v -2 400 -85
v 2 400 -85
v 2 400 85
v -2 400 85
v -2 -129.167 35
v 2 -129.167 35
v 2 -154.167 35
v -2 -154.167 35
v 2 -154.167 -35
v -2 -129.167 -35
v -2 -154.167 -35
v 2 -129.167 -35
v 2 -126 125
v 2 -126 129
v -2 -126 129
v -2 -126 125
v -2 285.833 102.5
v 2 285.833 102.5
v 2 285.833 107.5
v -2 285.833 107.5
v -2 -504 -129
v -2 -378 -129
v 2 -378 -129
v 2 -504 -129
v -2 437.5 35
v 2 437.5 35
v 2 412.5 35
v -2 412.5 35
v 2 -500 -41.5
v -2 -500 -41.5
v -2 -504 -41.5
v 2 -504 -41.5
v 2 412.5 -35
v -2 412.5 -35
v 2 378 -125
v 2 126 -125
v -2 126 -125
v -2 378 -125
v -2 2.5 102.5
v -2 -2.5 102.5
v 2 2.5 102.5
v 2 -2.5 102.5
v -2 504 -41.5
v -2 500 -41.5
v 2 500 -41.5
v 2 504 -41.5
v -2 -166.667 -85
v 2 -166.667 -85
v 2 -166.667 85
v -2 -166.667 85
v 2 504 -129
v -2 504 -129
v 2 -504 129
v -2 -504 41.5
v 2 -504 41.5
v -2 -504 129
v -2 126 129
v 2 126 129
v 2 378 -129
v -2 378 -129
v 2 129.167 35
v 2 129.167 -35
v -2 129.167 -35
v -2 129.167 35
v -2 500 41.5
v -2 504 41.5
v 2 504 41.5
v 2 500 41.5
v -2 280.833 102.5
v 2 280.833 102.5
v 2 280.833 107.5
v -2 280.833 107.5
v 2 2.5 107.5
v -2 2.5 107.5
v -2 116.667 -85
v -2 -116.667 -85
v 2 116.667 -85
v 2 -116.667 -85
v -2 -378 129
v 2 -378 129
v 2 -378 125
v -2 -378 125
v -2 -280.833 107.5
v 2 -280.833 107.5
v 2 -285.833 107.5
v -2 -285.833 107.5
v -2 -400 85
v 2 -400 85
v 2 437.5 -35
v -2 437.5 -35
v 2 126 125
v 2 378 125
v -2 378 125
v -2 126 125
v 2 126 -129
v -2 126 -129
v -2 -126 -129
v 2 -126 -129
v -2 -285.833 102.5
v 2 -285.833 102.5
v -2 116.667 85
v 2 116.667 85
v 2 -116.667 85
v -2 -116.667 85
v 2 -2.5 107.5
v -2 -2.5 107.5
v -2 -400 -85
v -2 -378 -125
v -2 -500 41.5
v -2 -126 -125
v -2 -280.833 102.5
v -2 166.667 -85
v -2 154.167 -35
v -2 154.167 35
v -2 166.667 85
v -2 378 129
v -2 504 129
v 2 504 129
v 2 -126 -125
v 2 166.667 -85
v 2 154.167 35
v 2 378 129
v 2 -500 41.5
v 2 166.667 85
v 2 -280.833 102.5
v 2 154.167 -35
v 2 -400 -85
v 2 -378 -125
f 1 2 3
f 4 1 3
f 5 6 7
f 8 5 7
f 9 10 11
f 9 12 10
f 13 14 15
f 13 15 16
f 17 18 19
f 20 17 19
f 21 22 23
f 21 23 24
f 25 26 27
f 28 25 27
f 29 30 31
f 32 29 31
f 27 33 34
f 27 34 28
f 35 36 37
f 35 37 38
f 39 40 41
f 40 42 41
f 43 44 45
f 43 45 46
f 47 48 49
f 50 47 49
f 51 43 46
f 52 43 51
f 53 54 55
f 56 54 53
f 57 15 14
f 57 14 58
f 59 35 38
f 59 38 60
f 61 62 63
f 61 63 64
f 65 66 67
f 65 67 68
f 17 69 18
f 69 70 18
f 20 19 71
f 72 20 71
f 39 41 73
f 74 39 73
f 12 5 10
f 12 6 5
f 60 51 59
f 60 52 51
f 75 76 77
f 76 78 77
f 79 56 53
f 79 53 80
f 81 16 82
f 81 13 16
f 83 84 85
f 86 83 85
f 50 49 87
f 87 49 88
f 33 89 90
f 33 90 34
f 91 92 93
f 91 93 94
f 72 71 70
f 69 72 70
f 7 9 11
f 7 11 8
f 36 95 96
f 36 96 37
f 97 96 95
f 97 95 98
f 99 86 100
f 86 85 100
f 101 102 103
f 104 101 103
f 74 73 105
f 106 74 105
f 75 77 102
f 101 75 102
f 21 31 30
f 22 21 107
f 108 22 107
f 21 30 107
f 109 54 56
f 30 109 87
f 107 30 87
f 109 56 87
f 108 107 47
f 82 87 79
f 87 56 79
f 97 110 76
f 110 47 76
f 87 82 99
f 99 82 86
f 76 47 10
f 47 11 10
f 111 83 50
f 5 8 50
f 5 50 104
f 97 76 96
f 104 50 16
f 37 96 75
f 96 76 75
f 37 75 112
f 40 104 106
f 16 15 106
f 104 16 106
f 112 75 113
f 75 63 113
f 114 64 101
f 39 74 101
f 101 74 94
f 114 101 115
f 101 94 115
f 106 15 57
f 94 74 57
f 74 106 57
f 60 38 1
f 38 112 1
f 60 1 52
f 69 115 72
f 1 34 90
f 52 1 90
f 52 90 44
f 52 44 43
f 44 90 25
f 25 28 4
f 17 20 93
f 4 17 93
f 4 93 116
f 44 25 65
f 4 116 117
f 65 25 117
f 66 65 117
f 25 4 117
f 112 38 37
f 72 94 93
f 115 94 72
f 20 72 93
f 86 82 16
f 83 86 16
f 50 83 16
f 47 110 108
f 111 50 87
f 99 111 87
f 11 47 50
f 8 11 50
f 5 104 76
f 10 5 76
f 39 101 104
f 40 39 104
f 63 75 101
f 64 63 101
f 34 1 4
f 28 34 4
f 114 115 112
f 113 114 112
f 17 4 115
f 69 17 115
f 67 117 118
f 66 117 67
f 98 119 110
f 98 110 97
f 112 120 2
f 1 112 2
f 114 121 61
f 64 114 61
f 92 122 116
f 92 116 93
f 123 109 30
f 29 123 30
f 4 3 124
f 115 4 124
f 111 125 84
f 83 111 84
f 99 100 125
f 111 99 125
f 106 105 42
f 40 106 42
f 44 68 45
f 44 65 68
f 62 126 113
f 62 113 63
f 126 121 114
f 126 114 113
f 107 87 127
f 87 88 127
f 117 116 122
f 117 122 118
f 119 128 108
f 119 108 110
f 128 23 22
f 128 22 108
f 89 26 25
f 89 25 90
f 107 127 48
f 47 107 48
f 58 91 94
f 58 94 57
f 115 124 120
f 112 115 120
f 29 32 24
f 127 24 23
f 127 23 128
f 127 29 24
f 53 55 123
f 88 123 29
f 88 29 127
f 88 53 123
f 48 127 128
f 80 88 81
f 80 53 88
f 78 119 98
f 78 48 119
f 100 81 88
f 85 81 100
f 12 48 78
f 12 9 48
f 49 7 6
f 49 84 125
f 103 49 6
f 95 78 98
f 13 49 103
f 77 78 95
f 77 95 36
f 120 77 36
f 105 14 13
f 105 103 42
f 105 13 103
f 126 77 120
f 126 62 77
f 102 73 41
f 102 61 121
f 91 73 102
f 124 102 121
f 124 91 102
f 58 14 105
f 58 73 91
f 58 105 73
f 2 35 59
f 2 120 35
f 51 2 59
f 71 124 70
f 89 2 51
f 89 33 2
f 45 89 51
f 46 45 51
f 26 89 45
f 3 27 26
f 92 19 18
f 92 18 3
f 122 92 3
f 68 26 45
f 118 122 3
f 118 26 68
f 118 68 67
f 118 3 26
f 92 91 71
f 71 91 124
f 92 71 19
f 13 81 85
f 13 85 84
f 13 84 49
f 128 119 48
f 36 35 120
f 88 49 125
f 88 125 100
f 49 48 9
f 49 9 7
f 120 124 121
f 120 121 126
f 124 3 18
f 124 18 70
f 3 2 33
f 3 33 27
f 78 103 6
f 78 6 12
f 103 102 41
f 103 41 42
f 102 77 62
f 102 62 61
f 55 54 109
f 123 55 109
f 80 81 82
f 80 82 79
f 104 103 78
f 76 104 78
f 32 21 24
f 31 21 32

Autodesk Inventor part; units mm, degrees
ref_plane "YZ Plane" through (0, 0, 0) normal (1, 0, 0) x (0, 1, 0)
ref_plane "XZ Plane" through (0, 0, 0) normal (0, 1, 0) x (-1, 0, 0)
ref_plane "XY Plane" through (0, 0, 0) normal (0, 0, 1) x (1, 0, 0)
sketch "Esboço1" plane through (0, 0, 0) normal (1, 0, 0) x (0, 1, 0)
  line L0 (-504, 129) -> (504, 129)
  line L1 (504, 129) -> (504, -129)
  line L2 (504, -129) -> (-504, -129)
  line L3 (-504, -129) -> (-504, 129)
  line L4 (-504, 129) -> (504, -129) construction
  line L5 (504, 129) -> (-504, -129) construction
  point P0 (0, 0)
  dimension "d0" = 1008
  dimension "d1" = 258
extrude "Extrusão1" add sketch "Esboço1" along normal mid plane 4
sketch "Esboço2" plane through (2, 0, 0) normal (1, 0, 0) x (0, 0, -1)
  line L0 (-133, 378) -> (-125, 378)
  line L1 (-125, 378) -> (-125, 126)
  line L2 (-125, 126) -> (-133, 126)
  line L3 (-133, 126) -> (-133, 378)
  line L4 (-129, 504) -> (-129, -504) projected
  line L5 (-133, 378) -> (-125, 126) construction
  line L6 (-125, 378) -> (-133, 126) construction
  line L7 (129, 504) -> (-129, 504) projected
  line L8 (-133, -126) -> (-125, -126)
  line L9 (-125, -126) -> (-125, -378)
  line L10 (-125, -378) -> (-133, -378)
  line L11 (-133, -378) -> (-133, -126)
  line L12 (-133, -126) -> (-125, -378) construction
  line L13 (-125, -126) -> (-133, -378) construction
  line L14 (-129, -504) -> (129, -504) projected
  line L15 (125, 378) -> (133, 378)
  line L16 (133, 378) -> (133, 126)
  line L17 (133, 126) -> (125, 126)
  line L18 (125, 126) -> (125, 378)
  line L19 (129, -504) -> (129, 504) projected
  line L20 (125, 378) -> (133, 126) construction
  line L21 (133, 378) -> (125, 126) construction
  line L22 (125, -126) -> (133, -126)
  line L23 (133, -126) -> (133, -378)
  line L24 (133, -378) -> (125, -378)
  line L25 (125, -378) -> (125, -126)
  line L26 (125, -126) -> (133, -378) construction
  line L27 (133, -126) -> (125, -378) construction
  point P0 (0, 0)
  point P1 (-129, 252)
  point P2 (-129, -252)
  point P3 (129, 252)
  point P4 (129, -252)
  dimension "d4" = 8
  dimension "d5" = 252
  dimension "d6" = 126
  dimension "d7" = 8
  dimension "d8" = 252
  dimension "d9" = 252
  dimension "d10" = 126
  dimension "d11" = 126
  dimension "d12" = 252
  dimension "d13" = 8
  dimension "d14" = 252
  dimension "d15" = 8
  dimension "d16" = 252
  dimension "d17" = 126
extrude "Extrusão2" cut sketch "Esboço2" along normal through all both and the other way through all contours L0 L4 L2 L3 | L0 L1 L2 L4 | L8 L9 L10 L4 | L4 L10 L11 L8 | L19 L17 L18 L15 | L15 L16 L17 L19 | L22 L23 L24 L19 | L19 L24 L25 L22
sketch "Esboço3" plane through (2, 0, 0) normal (1, 0, 0) x (0, 0, -1)
  line L0 (-41.5, 500) -> (41.5, 500)
  line L1 (41.5, 500) -> (41.5, 508)
  line L2 (41.5, 508) -> (-41.5, 508)
  line L3 (-41.5, 508) -> (-41.5, 500)
  line L4 (129, 504) -> (-129, 504) projected
  line L5 (-41.5, 500) -> (41.5, 508) construction
  line L6 (41.5, 500) -> (-41.5, 508) construction
  line L7 (-41.5, -500) -> (41.5, -500)
  line L8 (41.5, -500) -> (41.5, -508)
  line L9 (41.5, -508) -> (-41.5, -508)
  line L10 (-41.5, -508) -> (-41.5, -500)
  line L11 (-129, -504) -> (129, -504) projected
  line L12 (-41.5, -500) -> (41.5, -508) construction
  line L13 (41.5, -500) -> (-41.5, -508) construction
  point P0 (0, 0)
  point P1 (0, 504)
  point P2 (0, -504)
  dimension "d20" = 83
  dimension "d21" = 8
  dimension "d22" = 83
  dimension "d23" = 8
extrude "Extrusão3" cut sketch "Esboço3" along normal through all both and the other way through all
sketch "Esboço5" plane through (2, 0, 0) normal (1, 0, 0) x (0, 0, -1)
  line L0 (41.5, 500) -> (-41.5, 500) projected
  line L1 (0, 400) -> (-85, 400)
  line L2 (-125, 378) -> (-125, 126) projected
  line L3 (0, 400) -> (85, 400)
  line L4 (-85, 400) -> (-85, 166.6667)
  line L5 (-85, 166.6667) -> (85, 166.6667)
  line L6 (85, 166.6667) -> (85, 400)
  point P0 (0, 0)
  dimension "d39" = 85
  dimension "d40" = 85
  dimension "d41" = 233.3333
extrude "Extrusão5" cut sketch "Esboço5" against normal through all
pattern_linear "Padrão retangular2" count 3 spacing 283.3333 along (0, -1, 0) of "Extrusão5"
sketch "Esboço6" plane through (2, 0, 0) normal (1, 0, 0) x (0, 0, -1)
  line L0 (-85, -166.6667) -> (85, -166.6667) projected
  line L1 (85, -116.6667) -> (-85, -116.6667) projected
  line L2 (-85, -116.6667) -> (-35, -116.6667)
  line L3 (85, -116.6667) -> (35, -116.6667)
  line L4 (35, -116.6667) -> (-35, -116.6667)
  line L5 (-35, -129.1667) -> (35, -129.1667)
  line L6 (35, -129.1667) -> (35, -154.1667)
  line L7 (35, -154.1667) -> (-35, -154.1667)
  line L8 (-35, -129.1667) -> (-35, -154.1667)
  point P0 (0, 0)
  dimension "d47" = 50
  dimension "d48" = 50
  dimension "d49" = 50
  dimension "d50" = 12.5
  dimension "d51" = 25
extrude "Extrusão6" cut sketch "Esboço6" against normal through all
pattern_linear "Padrão retangular3" count 3 spacing 283.3333 along (0, 1, 0) of "Extrusão6"
sketch "Esboço7" plane through (2, 0, 0) normal (1, 0, 0) x (0, 0, -1)
  line L0 (-85, -400) -> (-85, -166.6667) projected
  line L1 (-125, -126) -> (-125, -378) projected
  line L2 (-85, 166.6667) -> (-85, 400) projected
  line L3 (-107.5, 280.8333) -> (-102.5, 280.8333)
  line L4 (-102.5, 280.8333) -> (-102.5, 285.8333)
  line L5 (-102.5, 285.8333) -> (-107.5, 285.8333)
  line L6 (-107.5, 285.8333) -> (-107.5, 280.8333)
  line L7 (-107.5, 280.8333) -> (-102.5, 285.8333) construction
  line L8 (-102.5, 280.8333) -> (-107.5, 285.8333) construction
  point P0 (0, 0)
  dimension "d60" = 5
  dimension "d61" = 5
extrude "Extrusão7" cut sketch "Esboço7" against normal through all
pattern_linear "Padrão retangular4" count 3 spacing 283.3333 along (0, -1, 0) of "Extrusão7"
properties part number "PAREDE FRONTAL"
